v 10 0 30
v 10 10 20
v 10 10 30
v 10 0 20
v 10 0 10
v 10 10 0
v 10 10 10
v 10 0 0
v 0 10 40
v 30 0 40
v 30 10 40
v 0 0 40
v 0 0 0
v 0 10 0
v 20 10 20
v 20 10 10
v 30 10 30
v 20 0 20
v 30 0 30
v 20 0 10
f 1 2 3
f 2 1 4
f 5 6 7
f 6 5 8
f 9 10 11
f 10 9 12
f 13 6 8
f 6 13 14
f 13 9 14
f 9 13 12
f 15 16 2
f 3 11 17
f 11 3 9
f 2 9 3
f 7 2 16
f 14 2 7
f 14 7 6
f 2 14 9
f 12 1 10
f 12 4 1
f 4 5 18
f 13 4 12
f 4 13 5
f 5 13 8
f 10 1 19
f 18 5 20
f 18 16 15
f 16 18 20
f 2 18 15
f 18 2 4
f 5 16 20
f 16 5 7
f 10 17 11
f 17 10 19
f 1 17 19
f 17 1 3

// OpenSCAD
cube([10, 10, 40]);
translate([10, 0, 10]) {
	cube(10);
}
translate([10, 0, 30]) {
	cube([20, 10, 10]);
}
